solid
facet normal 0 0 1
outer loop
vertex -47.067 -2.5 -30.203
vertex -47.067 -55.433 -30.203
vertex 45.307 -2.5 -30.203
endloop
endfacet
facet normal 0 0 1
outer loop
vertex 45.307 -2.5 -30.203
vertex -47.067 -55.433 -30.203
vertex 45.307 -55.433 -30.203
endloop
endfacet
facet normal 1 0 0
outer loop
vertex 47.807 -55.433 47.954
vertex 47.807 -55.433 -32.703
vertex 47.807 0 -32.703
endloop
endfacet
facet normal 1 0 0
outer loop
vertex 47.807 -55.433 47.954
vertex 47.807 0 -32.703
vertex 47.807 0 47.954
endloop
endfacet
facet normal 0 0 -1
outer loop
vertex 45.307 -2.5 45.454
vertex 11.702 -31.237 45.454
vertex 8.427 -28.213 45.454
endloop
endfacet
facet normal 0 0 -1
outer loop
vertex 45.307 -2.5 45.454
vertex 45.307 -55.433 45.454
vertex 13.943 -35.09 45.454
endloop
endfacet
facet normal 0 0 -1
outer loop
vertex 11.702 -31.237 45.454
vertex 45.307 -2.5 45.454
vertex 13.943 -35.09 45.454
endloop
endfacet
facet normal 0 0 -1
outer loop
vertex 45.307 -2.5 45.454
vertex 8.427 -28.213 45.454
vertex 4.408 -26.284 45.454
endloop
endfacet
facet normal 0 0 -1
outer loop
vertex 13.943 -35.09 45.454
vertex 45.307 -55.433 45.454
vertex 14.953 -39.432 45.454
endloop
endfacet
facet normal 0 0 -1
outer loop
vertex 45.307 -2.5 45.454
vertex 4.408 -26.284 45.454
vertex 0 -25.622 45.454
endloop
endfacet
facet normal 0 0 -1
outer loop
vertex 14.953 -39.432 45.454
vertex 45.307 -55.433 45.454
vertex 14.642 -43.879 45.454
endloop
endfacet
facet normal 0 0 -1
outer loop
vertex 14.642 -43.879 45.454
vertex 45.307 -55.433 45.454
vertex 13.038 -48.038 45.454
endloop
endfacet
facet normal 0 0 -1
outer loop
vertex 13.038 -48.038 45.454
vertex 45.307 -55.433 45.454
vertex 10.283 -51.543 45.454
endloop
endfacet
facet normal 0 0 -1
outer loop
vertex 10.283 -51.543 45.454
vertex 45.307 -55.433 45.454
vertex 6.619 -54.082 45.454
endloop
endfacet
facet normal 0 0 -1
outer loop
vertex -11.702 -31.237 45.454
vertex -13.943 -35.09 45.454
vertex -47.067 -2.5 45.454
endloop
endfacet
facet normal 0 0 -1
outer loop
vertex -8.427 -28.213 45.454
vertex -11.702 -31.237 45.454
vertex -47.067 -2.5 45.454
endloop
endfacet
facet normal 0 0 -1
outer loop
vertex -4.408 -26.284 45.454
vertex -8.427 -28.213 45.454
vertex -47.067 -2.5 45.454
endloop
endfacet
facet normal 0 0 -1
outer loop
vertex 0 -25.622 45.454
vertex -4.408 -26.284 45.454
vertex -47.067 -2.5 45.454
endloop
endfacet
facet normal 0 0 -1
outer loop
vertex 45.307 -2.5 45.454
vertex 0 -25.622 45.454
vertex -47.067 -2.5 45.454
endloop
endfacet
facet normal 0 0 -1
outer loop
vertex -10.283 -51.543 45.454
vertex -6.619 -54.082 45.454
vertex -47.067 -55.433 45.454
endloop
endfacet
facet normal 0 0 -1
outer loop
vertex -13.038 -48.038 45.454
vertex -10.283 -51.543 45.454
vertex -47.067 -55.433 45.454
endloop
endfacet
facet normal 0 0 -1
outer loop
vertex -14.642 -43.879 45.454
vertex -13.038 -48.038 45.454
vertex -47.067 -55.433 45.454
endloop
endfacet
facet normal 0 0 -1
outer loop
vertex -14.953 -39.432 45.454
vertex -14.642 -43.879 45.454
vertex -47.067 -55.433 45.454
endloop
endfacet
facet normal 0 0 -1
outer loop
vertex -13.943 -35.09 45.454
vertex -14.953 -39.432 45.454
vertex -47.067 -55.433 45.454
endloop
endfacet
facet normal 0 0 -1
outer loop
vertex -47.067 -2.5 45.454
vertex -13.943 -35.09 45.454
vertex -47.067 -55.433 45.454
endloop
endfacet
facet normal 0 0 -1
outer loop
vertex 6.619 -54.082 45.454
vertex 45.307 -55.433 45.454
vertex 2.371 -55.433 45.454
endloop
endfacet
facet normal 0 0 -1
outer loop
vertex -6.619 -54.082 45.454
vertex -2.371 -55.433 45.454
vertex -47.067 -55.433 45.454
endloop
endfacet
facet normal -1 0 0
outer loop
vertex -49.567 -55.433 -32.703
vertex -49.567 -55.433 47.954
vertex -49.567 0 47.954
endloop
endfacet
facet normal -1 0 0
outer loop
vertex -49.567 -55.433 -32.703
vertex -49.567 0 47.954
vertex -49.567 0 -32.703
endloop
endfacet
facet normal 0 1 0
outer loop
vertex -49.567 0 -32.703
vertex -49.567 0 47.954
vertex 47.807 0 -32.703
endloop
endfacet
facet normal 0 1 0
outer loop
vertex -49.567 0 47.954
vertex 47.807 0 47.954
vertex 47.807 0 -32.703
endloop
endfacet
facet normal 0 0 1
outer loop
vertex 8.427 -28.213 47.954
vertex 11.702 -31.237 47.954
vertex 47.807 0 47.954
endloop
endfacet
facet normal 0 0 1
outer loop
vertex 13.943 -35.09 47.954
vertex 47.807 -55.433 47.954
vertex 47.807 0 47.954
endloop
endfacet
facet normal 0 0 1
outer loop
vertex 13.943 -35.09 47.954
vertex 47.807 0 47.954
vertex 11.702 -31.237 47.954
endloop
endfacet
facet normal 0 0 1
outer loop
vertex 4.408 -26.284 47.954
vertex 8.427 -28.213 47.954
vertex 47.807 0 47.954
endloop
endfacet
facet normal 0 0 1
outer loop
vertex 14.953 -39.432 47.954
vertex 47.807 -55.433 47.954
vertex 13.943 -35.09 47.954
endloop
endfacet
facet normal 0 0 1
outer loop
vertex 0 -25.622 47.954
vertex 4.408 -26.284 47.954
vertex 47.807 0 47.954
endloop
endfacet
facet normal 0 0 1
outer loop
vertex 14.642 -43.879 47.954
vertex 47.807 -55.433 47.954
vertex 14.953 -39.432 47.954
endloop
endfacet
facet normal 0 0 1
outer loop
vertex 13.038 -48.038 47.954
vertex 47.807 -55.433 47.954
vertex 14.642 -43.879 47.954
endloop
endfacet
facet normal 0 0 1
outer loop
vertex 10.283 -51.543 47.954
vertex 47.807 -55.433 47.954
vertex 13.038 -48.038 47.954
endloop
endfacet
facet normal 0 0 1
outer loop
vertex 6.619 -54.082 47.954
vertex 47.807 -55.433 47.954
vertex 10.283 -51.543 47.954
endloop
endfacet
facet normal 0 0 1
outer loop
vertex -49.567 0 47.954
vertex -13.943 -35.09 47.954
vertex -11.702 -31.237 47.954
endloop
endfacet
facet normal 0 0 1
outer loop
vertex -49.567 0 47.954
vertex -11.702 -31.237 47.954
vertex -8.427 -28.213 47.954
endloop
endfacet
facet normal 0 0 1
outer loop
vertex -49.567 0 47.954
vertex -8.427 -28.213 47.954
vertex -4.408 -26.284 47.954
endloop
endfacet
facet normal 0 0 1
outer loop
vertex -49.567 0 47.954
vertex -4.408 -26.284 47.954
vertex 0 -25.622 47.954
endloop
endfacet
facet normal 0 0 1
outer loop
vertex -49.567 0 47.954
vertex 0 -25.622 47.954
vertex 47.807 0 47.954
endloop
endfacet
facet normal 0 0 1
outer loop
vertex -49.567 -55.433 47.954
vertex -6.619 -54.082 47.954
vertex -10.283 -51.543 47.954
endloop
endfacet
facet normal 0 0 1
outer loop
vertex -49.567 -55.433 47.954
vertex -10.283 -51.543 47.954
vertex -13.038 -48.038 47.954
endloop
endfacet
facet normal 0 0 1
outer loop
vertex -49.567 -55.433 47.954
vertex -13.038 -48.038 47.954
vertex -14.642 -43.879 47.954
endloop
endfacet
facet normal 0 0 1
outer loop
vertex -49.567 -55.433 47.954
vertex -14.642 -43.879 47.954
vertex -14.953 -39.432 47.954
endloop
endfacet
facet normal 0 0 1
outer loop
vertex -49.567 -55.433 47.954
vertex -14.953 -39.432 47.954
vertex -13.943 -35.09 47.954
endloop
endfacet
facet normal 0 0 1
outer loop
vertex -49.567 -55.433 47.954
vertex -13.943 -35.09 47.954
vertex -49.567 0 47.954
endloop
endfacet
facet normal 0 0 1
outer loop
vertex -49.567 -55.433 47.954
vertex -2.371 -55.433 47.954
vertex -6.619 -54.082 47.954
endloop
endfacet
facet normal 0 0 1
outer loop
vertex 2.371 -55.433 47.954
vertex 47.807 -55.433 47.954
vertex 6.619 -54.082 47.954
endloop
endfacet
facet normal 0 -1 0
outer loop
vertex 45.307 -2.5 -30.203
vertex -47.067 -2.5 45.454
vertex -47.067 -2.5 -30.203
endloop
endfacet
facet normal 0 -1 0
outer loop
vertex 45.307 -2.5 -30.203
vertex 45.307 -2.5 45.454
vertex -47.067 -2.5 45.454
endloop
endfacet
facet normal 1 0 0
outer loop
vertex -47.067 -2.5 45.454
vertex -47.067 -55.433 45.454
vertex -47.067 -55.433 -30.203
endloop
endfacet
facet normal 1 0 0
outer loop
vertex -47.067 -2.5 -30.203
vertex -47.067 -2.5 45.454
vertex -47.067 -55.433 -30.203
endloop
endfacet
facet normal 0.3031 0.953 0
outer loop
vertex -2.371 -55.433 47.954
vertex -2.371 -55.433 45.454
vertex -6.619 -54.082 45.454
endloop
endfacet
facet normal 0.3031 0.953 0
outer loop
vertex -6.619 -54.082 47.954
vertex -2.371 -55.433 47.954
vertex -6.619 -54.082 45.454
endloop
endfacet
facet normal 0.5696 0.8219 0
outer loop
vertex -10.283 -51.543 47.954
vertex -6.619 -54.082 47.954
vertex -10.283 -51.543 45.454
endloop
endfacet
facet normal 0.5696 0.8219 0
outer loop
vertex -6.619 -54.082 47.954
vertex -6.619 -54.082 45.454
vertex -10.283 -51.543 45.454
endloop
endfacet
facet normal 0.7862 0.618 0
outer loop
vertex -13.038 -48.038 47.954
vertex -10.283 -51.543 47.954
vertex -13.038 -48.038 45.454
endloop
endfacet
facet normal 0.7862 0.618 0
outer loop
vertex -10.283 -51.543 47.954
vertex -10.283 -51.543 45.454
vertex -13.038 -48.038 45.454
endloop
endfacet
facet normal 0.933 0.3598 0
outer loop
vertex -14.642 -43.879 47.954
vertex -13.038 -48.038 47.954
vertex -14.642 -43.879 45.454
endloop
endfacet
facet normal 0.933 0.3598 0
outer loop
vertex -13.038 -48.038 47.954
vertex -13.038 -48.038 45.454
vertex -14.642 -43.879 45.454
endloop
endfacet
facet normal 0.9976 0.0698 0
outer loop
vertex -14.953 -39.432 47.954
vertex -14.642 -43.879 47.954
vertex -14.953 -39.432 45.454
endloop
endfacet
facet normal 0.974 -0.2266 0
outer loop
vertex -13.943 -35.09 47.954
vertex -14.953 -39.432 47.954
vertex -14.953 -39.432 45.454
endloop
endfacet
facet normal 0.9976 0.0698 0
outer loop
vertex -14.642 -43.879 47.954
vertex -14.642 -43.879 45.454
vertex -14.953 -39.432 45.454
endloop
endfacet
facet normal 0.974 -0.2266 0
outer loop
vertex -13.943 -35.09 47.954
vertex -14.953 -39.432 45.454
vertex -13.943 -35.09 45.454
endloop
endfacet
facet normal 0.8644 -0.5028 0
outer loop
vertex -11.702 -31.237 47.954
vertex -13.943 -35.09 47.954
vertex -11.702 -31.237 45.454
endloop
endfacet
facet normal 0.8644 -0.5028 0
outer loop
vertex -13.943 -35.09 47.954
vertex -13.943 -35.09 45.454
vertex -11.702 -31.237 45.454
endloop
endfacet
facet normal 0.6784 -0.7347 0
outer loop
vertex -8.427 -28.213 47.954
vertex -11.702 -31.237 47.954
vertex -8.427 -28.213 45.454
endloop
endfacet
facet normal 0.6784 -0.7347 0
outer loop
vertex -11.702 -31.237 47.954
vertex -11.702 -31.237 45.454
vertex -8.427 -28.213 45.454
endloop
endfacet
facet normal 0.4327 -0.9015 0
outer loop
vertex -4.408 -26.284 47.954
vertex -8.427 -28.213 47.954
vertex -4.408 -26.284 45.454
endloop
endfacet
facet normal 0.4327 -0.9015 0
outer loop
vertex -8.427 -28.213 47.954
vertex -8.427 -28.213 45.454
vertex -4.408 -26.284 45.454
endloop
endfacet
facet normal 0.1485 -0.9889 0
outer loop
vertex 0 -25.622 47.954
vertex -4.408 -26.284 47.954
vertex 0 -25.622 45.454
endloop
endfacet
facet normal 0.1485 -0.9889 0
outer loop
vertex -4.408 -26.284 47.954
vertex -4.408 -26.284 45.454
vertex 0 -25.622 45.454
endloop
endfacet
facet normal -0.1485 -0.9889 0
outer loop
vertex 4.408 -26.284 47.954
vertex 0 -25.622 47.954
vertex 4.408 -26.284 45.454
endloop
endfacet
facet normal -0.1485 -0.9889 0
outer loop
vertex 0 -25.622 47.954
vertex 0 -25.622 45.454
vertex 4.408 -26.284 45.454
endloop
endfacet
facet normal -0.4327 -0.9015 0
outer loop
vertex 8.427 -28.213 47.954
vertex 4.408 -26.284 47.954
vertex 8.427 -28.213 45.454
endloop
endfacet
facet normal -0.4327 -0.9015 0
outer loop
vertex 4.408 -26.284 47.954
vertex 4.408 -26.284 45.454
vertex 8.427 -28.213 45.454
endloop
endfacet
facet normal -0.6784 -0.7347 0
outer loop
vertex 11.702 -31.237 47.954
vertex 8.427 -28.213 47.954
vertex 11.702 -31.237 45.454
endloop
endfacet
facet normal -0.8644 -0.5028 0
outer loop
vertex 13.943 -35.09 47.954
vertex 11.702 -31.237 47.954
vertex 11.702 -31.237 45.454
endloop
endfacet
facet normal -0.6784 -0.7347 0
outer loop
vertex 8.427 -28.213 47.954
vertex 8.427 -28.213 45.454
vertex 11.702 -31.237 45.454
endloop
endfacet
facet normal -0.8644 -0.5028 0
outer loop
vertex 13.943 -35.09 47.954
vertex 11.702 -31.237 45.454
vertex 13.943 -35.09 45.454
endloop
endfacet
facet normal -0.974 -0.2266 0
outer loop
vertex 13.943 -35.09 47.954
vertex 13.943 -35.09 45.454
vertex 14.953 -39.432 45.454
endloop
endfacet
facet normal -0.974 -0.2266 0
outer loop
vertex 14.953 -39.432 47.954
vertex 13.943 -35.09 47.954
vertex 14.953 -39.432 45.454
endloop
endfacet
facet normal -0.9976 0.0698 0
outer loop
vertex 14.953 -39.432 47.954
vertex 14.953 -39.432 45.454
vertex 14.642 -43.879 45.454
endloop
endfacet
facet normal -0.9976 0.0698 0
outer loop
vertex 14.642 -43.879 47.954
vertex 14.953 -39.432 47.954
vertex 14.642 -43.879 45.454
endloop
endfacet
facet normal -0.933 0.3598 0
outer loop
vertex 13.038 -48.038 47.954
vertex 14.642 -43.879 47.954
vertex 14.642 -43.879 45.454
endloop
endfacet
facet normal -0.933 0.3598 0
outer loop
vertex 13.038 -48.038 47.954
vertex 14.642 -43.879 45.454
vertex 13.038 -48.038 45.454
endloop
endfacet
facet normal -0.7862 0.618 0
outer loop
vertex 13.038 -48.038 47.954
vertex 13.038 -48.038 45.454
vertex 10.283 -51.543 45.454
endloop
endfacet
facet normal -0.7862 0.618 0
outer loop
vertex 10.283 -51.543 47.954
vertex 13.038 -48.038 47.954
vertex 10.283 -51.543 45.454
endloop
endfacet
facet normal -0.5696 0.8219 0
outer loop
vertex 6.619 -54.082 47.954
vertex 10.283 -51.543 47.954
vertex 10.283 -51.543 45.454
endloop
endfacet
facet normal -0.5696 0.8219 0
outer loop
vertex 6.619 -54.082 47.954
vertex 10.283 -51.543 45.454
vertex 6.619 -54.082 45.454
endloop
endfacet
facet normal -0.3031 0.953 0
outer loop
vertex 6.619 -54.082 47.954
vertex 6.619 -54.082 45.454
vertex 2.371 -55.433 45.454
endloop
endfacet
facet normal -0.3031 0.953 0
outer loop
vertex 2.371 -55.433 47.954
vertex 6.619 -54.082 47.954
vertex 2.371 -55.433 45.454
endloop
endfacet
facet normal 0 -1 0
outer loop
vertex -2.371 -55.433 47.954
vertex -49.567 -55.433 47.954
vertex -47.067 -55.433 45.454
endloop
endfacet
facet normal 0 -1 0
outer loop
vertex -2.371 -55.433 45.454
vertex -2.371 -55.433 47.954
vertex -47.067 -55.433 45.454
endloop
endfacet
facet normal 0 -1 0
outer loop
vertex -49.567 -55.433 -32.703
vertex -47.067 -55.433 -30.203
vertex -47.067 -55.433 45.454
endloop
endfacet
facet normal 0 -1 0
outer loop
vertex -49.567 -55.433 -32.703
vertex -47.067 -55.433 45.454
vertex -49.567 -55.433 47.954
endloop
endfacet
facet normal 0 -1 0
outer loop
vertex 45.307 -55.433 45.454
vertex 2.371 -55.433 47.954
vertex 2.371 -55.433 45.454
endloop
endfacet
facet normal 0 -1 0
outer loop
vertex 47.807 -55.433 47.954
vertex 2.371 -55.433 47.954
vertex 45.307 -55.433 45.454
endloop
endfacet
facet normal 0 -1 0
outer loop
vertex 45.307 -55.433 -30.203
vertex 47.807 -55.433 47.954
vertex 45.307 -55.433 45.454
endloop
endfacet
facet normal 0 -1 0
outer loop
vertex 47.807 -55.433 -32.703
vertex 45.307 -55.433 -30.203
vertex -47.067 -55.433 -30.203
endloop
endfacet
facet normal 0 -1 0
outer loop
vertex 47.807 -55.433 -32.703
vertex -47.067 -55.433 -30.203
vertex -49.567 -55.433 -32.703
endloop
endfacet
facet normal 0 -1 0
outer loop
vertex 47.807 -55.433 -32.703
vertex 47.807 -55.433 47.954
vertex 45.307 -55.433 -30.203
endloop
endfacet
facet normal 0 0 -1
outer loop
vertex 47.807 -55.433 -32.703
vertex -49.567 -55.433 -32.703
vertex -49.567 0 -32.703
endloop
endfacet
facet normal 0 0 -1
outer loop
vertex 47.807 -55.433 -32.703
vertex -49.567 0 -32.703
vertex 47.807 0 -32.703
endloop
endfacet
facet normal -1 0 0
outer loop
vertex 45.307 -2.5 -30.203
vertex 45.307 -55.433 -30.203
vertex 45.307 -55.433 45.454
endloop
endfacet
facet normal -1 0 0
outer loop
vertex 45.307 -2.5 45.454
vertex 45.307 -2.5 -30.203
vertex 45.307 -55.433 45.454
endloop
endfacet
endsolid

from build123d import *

# Parameters (mm, degrees)
F3_T     = -2.5
F5_D     = 30
F5_DEPTH = 12
F5_TIP   = 9.0129092854


with BuildPart() as f2:
    # F2: sweep along a path in F1
    with BuildLine(Plane.YZ) as f2_path:
        Line((0, 0), (-55.432960391, 0))
    # F0 (on Front) → F2 (sweep)
    with BuildSketch(Plane.XZ):
        Polygon((-49.567040056, 47.953914851), (-49.567040056, 42.0879907906), (-49.567040056, -32.7025167644), (47.8072650731, -32.7025167644), (47.8072650731, 47.953914851), align=None)
    sweep(path=f2_path.line)

    # F3
    f3_openings = [f2.faces().sort_by_distance(p)[0] for p in [
        (-0.879887, -55.43296, 7.625699),
    ]]
    offset(amount=F3_T, openings=f3_openings)

    # F5
    with Locations(Plane.XY.offset(47.953914851)):
        with Locations((0, -40.6215079129)):
            Hole(F5_D / 2, depth=F5_DEPTH)
            with Locations((0, 0, -(F5_DEPTH + F5_TIP / 2))):  # 118° drill point
                Cone(0, F5_D / 2, F5_TIP, mode=Mode.SUBTRACT)


solid = f2.part
